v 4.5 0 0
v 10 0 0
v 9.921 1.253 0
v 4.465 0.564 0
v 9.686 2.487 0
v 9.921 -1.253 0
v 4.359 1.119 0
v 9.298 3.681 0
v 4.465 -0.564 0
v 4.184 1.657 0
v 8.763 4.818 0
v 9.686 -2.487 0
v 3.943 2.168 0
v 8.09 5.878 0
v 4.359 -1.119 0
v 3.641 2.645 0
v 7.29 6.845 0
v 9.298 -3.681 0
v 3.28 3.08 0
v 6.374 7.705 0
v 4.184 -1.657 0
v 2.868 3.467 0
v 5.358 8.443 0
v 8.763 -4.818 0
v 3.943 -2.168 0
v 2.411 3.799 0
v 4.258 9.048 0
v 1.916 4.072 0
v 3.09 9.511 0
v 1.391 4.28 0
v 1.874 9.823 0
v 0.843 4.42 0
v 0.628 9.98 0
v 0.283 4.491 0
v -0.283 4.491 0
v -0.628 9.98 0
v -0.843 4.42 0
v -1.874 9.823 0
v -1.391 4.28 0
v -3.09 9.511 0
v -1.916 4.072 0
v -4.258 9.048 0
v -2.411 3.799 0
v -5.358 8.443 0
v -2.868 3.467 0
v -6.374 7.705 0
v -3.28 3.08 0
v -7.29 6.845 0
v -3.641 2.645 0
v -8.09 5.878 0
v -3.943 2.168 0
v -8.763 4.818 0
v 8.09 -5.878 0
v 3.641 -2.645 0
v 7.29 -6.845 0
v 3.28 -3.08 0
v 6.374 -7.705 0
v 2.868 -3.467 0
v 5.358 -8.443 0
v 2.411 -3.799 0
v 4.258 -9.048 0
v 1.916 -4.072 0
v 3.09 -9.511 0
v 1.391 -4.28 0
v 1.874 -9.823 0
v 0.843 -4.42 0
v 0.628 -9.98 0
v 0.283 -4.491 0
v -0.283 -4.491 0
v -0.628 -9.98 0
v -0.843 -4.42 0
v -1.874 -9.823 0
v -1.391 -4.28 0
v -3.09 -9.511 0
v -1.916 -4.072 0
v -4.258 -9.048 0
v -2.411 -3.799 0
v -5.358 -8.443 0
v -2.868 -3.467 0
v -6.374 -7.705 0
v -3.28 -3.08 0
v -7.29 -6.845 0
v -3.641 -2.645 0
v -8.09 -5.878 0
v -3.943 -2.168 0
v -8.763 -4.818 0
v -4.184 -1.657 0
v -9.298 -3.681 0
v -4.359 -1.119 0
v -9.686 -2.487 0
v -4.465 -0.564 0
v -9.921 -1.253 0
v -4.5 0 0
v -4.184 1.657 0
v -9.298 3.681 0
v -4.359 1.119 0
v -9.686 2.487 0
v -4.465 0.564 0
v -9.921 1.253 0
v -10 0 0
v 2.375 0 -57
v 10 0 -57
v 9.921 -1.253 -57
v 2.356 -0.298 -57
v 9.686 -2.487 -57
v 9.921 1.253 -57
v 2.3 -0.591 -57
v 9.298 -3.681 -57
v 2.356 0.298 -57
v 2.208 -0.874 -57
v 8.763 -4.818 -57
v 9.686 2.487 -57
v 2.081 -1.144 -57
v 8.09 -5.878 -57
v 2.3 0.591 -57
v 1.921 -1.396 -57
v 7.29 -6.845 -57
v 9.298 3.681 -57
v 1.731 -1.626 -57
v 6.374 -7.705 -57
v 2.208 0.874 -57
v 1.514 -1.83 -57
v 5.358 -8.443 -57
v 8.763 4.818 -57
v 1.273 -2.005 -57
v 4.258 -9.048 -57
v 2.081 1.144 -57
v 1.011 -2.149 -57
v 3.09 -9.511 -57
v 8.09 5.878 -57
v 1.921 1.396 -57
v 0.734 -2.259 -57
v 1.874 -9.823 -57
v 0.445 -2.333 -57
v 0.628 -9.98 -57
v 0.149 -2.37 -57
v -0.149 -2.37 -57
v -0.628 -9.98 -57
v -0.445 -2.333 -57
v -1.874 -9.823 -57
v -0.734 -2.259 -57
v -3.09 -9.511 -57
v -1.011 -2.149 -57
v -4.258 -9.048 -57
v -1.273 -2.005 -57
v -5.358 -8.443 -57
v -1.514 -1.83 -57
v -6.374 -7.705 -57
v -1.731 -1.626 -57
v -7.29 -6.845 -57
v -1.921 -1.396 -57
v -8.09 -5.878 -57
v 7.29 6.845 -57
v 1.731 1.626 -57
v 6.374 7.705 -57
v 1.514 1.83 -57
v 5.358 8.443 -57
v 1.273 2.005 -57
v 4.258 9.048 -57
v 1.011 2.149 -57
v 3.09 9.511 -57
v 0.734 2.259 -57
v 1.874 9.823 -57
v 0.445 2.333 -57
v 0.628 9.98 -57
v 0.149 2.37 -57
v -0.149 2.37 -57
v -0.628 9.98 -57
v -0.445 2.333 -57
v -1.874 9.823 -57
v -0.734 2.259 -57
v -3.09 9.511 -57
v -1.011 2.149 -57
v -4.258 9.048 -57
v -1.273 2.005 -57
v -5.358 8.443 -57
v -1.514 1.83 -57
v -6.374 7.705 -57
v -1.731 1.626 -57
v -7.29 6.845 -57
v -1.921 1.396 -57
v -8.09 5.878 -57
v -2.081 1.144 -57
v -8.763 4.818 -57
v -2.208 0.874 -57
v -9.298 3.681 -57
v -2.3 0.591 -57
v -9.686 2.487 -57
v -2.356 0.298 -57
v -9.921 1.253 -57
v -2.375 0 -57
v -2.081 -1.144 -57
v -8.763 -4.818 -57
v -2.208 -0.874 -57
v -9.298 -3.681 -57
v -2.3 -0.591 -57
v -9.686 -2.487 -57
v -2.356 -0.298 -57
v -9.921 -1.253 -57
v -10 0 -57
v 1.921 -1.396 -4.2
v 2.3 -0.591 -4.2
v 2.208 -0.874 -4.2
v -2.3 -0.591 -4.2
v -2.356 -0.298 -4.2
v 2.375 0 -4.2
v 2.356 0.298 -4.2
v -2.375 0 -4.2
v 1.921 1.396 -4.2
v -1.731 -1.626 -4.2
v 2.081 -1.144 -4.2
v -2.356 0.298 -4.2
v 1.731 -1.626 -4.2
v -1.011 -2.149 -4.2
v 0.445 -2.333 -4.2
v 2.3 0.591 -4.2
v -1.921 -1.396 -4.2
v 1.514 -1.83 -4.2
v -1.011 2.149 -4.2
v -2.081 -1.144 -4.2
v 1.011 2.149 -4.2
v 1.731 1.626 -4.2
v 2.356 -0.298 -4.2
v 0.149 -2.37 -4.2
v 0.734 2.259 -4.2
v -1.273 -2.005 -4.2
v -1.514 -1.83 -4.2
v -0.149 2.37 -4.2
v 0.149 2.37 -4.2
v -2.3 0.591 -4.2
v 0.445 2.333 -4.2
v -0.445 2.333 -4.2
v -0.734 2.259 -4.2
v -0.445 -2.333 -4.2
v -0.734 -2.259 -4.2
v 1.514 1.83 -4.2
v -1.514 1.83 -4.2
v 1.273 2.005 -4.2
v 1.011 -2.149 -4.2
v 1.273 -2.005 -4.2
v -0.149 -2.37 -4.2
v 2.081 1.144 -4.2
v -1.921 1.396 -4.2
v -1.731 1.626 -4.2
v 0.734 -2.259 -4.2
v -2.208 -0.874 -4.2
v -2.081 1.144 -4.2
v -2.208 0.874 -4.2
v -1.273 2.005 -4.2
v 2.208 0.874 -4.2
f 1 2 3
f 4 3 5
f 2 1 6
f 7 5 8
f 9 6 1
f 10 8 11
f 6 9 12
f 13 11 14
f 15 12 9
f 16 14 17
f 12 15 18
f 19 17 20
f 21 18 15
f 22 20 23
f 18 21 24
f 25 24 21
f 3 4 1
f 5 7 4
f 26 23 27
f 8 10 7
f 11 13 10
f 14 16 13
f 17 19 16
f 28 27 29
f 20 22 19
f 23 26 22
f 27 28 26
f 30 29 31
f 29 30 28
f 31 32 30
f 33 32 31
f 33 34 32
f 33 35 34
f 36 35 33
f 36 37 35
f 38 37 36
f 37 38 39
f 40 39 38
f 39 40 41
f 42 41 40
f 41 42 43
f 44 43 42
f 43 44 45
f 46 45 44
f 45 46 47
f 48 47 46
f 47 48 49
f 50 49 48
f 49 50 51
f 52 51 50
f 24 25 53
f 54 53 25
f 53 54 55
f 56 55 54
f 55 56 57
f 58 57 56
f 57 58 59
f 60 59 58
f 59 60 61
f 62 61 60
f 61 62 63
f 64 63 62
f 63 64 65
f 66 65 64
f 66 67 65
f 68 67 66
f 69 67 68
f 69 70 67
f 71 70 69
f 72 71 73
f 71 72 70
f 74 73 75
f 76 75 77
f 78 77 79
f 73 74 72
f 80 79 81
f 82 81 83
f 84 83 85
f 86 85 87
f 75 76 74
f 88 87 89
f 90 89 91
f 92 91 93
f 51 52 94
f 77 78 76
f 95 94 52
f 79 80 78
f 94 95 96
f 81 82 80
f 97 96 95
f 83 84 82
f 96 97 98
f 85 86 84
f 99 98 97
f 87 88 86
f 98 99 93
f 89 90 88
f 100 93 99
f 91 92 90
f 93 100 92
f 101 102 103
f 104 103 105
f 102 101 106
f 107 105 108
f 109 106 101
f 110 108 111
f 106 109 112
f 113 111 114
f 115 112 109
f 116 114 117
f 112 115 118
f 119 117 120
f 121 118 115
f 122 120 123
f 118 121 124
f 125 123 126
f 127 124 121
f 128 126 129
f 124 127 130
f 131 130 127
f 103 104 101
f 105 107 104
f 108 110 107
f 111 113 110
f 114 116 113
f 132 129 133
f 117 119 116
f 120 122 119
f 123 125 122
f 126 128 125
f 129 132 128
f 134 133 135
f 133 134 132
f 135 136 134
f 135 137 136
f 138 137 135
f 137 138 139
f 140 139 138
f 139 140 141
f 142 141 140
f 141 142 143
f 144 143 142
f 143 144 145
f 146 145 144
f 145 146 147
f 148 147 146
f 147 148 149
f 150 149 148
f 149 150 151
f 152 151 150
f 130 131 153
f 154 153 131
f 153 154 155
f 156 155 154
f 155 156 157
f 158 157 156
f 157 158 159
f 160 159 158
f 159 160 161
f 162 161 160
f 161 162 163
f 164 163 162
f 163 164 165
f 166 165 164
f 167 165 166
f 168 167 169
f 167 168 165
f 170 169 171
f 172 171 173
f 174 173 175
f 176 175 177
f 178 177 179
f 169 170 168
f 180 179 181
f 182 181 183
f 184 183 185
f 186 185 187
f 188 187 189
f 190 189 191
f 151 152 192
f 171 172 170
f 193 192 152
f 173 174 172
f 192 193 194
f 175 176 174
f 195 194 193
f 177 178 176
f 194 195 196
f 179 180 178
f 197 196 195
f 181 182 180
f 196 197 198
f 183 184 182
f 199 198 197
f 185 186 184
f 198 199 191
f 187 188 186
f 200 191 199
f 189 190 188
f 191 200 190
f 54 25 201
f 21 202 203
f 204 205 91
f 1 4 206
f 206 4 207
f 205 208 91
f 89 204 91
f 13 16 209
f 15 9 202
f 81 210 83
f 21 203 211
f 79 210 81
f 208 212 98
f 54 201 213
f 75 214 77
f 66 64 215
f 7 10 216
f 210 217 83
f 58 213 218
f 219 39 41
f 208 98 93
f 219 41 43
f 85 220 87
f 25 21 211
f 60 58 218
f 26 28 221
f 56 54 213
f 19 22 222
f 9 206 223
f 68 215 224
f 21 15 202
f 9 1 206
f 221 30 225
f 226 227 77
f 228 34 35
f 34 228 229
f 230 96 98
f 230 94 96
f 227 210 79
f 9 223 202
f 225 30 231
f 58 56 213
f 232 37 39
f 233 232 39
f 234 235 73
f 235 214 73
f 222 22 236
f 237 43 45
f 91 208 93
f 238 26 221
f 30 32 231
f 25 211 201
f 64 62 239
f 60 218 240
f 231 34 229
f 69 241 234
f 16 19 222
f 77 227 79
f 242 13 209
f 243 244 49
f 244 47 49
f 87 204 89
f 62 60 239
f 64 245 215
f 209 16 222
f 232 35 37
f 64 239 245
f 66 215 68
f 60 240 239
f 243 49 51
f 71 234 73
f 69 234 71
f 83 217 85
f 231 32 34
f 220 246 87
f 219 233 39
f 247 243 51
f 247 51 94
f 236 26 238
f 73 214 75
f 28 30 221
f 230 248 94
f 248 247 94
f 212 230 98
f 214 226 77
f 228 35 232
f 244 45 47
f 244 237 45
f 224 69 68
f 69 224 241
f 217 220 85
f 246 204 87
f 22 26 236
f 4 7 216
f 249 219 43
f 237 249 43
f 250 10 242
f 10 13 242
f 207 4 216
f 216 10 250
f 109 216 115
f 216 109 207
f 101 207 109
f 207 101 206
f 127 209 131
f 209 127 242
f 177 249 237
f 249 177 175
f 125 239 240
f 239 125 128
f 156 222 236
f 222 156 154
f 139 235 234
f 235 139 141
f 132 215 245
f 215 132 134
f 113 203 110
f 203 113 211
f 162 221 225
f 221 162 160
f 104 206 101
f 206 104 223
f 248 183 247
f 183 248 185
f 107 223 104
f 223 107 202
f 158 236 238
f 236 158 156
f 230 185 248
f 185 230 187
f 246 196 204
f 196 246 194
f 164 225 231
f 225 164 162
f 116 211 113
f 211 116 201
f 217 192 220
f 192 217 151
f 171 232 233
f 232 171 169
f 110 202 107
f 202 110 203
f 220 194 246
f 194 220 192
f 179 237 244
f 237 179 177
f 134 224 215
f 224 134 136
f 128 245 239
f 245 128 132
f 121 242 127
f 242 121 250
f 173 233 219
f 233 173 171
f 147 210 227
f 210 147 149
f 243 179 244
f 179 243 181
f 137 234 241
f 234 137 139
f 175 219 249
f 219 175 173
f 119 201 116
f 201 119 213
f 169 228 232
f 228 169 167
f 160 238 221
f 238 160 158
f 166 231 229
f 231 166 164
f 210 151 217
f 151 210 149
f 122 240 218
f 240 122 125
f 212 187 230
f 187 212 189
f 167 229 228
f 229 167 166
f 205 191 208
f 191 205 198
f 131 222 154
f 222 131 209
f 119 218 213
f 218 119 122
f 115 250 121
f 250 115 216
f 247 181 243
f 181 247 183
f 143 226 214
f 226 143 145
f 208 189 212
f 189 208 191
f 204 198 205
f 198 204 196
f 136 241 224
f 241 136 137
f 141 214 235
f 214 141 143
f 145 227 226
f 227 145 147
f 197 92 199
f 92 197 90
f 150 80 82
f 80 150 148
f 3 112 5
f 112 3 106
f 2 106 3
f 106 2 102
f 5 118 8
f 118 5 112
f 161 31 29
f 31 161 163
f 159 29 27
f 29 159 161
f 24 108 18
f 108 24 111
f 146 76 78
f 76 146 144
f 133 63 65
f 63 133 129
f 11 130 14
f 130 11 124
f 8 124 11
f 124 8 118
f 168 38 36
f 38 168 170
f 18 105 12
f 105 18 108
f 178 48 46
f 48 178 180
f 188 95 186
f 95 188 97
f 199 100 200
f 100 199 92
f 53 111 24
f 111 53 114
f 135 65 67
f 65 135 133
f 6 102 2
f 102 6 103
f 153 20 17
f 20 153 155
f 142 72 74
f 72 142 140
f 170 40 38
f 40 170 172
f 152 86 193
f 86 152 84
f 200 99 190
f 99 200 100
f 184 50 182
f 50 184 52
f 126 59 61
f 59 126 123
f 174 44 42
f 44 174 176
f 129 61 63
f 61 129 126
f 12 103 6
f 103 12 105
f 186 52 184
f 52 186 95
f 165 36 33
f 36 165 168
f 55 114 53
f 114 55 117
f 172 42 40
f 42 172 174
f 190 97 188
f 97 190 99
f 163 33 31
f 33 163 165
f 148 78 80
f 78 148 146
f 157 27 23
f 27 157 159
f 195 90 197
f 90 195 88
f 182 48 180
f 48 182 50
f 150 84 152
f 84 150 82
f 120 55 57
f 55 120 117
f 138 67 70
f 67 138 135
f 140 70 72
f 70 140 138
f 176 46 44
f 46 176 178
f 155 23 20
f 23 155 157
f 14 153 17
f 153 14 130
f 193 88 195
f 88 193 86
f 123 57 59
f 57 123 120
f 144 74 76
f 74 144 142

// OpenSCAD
$fn = 50;


difference() {
	union() {
		translate(v = [0, 0, -57.0000000000]) {
			cylinder(h = 57, r = 10.0000000000);
		}
		cylinder(h = 0, r = 19.0000000000);
	}
	union() {
		translate(v = [0, 0, 0]) {
			rotate(a = [0, 0, 0]) {
				difference() {
					union() {
						#translate(v = [0, 0, -57.0000000000]) {
							cylinder(h = 57, r = 2.2500000000);
						}
						#translate(v = [0, 0, -4.2000000000]) {
							cylinder(h = 4.2000000000, r = 10.0000000000, r1 = 2.3750000000, r2 = 4.5000000000);
						}
						#translate(v = [0, 0, -57.0000000000]) {
							cylinder(h = 57, r = 2.3750000000);
						}
						#translate(v = [0, 0, -57.0000000000]) {
							cylinder(h = 57, r = 2.2500000000);
						}
					}
					union();
				}
			}
		}
	}
}
